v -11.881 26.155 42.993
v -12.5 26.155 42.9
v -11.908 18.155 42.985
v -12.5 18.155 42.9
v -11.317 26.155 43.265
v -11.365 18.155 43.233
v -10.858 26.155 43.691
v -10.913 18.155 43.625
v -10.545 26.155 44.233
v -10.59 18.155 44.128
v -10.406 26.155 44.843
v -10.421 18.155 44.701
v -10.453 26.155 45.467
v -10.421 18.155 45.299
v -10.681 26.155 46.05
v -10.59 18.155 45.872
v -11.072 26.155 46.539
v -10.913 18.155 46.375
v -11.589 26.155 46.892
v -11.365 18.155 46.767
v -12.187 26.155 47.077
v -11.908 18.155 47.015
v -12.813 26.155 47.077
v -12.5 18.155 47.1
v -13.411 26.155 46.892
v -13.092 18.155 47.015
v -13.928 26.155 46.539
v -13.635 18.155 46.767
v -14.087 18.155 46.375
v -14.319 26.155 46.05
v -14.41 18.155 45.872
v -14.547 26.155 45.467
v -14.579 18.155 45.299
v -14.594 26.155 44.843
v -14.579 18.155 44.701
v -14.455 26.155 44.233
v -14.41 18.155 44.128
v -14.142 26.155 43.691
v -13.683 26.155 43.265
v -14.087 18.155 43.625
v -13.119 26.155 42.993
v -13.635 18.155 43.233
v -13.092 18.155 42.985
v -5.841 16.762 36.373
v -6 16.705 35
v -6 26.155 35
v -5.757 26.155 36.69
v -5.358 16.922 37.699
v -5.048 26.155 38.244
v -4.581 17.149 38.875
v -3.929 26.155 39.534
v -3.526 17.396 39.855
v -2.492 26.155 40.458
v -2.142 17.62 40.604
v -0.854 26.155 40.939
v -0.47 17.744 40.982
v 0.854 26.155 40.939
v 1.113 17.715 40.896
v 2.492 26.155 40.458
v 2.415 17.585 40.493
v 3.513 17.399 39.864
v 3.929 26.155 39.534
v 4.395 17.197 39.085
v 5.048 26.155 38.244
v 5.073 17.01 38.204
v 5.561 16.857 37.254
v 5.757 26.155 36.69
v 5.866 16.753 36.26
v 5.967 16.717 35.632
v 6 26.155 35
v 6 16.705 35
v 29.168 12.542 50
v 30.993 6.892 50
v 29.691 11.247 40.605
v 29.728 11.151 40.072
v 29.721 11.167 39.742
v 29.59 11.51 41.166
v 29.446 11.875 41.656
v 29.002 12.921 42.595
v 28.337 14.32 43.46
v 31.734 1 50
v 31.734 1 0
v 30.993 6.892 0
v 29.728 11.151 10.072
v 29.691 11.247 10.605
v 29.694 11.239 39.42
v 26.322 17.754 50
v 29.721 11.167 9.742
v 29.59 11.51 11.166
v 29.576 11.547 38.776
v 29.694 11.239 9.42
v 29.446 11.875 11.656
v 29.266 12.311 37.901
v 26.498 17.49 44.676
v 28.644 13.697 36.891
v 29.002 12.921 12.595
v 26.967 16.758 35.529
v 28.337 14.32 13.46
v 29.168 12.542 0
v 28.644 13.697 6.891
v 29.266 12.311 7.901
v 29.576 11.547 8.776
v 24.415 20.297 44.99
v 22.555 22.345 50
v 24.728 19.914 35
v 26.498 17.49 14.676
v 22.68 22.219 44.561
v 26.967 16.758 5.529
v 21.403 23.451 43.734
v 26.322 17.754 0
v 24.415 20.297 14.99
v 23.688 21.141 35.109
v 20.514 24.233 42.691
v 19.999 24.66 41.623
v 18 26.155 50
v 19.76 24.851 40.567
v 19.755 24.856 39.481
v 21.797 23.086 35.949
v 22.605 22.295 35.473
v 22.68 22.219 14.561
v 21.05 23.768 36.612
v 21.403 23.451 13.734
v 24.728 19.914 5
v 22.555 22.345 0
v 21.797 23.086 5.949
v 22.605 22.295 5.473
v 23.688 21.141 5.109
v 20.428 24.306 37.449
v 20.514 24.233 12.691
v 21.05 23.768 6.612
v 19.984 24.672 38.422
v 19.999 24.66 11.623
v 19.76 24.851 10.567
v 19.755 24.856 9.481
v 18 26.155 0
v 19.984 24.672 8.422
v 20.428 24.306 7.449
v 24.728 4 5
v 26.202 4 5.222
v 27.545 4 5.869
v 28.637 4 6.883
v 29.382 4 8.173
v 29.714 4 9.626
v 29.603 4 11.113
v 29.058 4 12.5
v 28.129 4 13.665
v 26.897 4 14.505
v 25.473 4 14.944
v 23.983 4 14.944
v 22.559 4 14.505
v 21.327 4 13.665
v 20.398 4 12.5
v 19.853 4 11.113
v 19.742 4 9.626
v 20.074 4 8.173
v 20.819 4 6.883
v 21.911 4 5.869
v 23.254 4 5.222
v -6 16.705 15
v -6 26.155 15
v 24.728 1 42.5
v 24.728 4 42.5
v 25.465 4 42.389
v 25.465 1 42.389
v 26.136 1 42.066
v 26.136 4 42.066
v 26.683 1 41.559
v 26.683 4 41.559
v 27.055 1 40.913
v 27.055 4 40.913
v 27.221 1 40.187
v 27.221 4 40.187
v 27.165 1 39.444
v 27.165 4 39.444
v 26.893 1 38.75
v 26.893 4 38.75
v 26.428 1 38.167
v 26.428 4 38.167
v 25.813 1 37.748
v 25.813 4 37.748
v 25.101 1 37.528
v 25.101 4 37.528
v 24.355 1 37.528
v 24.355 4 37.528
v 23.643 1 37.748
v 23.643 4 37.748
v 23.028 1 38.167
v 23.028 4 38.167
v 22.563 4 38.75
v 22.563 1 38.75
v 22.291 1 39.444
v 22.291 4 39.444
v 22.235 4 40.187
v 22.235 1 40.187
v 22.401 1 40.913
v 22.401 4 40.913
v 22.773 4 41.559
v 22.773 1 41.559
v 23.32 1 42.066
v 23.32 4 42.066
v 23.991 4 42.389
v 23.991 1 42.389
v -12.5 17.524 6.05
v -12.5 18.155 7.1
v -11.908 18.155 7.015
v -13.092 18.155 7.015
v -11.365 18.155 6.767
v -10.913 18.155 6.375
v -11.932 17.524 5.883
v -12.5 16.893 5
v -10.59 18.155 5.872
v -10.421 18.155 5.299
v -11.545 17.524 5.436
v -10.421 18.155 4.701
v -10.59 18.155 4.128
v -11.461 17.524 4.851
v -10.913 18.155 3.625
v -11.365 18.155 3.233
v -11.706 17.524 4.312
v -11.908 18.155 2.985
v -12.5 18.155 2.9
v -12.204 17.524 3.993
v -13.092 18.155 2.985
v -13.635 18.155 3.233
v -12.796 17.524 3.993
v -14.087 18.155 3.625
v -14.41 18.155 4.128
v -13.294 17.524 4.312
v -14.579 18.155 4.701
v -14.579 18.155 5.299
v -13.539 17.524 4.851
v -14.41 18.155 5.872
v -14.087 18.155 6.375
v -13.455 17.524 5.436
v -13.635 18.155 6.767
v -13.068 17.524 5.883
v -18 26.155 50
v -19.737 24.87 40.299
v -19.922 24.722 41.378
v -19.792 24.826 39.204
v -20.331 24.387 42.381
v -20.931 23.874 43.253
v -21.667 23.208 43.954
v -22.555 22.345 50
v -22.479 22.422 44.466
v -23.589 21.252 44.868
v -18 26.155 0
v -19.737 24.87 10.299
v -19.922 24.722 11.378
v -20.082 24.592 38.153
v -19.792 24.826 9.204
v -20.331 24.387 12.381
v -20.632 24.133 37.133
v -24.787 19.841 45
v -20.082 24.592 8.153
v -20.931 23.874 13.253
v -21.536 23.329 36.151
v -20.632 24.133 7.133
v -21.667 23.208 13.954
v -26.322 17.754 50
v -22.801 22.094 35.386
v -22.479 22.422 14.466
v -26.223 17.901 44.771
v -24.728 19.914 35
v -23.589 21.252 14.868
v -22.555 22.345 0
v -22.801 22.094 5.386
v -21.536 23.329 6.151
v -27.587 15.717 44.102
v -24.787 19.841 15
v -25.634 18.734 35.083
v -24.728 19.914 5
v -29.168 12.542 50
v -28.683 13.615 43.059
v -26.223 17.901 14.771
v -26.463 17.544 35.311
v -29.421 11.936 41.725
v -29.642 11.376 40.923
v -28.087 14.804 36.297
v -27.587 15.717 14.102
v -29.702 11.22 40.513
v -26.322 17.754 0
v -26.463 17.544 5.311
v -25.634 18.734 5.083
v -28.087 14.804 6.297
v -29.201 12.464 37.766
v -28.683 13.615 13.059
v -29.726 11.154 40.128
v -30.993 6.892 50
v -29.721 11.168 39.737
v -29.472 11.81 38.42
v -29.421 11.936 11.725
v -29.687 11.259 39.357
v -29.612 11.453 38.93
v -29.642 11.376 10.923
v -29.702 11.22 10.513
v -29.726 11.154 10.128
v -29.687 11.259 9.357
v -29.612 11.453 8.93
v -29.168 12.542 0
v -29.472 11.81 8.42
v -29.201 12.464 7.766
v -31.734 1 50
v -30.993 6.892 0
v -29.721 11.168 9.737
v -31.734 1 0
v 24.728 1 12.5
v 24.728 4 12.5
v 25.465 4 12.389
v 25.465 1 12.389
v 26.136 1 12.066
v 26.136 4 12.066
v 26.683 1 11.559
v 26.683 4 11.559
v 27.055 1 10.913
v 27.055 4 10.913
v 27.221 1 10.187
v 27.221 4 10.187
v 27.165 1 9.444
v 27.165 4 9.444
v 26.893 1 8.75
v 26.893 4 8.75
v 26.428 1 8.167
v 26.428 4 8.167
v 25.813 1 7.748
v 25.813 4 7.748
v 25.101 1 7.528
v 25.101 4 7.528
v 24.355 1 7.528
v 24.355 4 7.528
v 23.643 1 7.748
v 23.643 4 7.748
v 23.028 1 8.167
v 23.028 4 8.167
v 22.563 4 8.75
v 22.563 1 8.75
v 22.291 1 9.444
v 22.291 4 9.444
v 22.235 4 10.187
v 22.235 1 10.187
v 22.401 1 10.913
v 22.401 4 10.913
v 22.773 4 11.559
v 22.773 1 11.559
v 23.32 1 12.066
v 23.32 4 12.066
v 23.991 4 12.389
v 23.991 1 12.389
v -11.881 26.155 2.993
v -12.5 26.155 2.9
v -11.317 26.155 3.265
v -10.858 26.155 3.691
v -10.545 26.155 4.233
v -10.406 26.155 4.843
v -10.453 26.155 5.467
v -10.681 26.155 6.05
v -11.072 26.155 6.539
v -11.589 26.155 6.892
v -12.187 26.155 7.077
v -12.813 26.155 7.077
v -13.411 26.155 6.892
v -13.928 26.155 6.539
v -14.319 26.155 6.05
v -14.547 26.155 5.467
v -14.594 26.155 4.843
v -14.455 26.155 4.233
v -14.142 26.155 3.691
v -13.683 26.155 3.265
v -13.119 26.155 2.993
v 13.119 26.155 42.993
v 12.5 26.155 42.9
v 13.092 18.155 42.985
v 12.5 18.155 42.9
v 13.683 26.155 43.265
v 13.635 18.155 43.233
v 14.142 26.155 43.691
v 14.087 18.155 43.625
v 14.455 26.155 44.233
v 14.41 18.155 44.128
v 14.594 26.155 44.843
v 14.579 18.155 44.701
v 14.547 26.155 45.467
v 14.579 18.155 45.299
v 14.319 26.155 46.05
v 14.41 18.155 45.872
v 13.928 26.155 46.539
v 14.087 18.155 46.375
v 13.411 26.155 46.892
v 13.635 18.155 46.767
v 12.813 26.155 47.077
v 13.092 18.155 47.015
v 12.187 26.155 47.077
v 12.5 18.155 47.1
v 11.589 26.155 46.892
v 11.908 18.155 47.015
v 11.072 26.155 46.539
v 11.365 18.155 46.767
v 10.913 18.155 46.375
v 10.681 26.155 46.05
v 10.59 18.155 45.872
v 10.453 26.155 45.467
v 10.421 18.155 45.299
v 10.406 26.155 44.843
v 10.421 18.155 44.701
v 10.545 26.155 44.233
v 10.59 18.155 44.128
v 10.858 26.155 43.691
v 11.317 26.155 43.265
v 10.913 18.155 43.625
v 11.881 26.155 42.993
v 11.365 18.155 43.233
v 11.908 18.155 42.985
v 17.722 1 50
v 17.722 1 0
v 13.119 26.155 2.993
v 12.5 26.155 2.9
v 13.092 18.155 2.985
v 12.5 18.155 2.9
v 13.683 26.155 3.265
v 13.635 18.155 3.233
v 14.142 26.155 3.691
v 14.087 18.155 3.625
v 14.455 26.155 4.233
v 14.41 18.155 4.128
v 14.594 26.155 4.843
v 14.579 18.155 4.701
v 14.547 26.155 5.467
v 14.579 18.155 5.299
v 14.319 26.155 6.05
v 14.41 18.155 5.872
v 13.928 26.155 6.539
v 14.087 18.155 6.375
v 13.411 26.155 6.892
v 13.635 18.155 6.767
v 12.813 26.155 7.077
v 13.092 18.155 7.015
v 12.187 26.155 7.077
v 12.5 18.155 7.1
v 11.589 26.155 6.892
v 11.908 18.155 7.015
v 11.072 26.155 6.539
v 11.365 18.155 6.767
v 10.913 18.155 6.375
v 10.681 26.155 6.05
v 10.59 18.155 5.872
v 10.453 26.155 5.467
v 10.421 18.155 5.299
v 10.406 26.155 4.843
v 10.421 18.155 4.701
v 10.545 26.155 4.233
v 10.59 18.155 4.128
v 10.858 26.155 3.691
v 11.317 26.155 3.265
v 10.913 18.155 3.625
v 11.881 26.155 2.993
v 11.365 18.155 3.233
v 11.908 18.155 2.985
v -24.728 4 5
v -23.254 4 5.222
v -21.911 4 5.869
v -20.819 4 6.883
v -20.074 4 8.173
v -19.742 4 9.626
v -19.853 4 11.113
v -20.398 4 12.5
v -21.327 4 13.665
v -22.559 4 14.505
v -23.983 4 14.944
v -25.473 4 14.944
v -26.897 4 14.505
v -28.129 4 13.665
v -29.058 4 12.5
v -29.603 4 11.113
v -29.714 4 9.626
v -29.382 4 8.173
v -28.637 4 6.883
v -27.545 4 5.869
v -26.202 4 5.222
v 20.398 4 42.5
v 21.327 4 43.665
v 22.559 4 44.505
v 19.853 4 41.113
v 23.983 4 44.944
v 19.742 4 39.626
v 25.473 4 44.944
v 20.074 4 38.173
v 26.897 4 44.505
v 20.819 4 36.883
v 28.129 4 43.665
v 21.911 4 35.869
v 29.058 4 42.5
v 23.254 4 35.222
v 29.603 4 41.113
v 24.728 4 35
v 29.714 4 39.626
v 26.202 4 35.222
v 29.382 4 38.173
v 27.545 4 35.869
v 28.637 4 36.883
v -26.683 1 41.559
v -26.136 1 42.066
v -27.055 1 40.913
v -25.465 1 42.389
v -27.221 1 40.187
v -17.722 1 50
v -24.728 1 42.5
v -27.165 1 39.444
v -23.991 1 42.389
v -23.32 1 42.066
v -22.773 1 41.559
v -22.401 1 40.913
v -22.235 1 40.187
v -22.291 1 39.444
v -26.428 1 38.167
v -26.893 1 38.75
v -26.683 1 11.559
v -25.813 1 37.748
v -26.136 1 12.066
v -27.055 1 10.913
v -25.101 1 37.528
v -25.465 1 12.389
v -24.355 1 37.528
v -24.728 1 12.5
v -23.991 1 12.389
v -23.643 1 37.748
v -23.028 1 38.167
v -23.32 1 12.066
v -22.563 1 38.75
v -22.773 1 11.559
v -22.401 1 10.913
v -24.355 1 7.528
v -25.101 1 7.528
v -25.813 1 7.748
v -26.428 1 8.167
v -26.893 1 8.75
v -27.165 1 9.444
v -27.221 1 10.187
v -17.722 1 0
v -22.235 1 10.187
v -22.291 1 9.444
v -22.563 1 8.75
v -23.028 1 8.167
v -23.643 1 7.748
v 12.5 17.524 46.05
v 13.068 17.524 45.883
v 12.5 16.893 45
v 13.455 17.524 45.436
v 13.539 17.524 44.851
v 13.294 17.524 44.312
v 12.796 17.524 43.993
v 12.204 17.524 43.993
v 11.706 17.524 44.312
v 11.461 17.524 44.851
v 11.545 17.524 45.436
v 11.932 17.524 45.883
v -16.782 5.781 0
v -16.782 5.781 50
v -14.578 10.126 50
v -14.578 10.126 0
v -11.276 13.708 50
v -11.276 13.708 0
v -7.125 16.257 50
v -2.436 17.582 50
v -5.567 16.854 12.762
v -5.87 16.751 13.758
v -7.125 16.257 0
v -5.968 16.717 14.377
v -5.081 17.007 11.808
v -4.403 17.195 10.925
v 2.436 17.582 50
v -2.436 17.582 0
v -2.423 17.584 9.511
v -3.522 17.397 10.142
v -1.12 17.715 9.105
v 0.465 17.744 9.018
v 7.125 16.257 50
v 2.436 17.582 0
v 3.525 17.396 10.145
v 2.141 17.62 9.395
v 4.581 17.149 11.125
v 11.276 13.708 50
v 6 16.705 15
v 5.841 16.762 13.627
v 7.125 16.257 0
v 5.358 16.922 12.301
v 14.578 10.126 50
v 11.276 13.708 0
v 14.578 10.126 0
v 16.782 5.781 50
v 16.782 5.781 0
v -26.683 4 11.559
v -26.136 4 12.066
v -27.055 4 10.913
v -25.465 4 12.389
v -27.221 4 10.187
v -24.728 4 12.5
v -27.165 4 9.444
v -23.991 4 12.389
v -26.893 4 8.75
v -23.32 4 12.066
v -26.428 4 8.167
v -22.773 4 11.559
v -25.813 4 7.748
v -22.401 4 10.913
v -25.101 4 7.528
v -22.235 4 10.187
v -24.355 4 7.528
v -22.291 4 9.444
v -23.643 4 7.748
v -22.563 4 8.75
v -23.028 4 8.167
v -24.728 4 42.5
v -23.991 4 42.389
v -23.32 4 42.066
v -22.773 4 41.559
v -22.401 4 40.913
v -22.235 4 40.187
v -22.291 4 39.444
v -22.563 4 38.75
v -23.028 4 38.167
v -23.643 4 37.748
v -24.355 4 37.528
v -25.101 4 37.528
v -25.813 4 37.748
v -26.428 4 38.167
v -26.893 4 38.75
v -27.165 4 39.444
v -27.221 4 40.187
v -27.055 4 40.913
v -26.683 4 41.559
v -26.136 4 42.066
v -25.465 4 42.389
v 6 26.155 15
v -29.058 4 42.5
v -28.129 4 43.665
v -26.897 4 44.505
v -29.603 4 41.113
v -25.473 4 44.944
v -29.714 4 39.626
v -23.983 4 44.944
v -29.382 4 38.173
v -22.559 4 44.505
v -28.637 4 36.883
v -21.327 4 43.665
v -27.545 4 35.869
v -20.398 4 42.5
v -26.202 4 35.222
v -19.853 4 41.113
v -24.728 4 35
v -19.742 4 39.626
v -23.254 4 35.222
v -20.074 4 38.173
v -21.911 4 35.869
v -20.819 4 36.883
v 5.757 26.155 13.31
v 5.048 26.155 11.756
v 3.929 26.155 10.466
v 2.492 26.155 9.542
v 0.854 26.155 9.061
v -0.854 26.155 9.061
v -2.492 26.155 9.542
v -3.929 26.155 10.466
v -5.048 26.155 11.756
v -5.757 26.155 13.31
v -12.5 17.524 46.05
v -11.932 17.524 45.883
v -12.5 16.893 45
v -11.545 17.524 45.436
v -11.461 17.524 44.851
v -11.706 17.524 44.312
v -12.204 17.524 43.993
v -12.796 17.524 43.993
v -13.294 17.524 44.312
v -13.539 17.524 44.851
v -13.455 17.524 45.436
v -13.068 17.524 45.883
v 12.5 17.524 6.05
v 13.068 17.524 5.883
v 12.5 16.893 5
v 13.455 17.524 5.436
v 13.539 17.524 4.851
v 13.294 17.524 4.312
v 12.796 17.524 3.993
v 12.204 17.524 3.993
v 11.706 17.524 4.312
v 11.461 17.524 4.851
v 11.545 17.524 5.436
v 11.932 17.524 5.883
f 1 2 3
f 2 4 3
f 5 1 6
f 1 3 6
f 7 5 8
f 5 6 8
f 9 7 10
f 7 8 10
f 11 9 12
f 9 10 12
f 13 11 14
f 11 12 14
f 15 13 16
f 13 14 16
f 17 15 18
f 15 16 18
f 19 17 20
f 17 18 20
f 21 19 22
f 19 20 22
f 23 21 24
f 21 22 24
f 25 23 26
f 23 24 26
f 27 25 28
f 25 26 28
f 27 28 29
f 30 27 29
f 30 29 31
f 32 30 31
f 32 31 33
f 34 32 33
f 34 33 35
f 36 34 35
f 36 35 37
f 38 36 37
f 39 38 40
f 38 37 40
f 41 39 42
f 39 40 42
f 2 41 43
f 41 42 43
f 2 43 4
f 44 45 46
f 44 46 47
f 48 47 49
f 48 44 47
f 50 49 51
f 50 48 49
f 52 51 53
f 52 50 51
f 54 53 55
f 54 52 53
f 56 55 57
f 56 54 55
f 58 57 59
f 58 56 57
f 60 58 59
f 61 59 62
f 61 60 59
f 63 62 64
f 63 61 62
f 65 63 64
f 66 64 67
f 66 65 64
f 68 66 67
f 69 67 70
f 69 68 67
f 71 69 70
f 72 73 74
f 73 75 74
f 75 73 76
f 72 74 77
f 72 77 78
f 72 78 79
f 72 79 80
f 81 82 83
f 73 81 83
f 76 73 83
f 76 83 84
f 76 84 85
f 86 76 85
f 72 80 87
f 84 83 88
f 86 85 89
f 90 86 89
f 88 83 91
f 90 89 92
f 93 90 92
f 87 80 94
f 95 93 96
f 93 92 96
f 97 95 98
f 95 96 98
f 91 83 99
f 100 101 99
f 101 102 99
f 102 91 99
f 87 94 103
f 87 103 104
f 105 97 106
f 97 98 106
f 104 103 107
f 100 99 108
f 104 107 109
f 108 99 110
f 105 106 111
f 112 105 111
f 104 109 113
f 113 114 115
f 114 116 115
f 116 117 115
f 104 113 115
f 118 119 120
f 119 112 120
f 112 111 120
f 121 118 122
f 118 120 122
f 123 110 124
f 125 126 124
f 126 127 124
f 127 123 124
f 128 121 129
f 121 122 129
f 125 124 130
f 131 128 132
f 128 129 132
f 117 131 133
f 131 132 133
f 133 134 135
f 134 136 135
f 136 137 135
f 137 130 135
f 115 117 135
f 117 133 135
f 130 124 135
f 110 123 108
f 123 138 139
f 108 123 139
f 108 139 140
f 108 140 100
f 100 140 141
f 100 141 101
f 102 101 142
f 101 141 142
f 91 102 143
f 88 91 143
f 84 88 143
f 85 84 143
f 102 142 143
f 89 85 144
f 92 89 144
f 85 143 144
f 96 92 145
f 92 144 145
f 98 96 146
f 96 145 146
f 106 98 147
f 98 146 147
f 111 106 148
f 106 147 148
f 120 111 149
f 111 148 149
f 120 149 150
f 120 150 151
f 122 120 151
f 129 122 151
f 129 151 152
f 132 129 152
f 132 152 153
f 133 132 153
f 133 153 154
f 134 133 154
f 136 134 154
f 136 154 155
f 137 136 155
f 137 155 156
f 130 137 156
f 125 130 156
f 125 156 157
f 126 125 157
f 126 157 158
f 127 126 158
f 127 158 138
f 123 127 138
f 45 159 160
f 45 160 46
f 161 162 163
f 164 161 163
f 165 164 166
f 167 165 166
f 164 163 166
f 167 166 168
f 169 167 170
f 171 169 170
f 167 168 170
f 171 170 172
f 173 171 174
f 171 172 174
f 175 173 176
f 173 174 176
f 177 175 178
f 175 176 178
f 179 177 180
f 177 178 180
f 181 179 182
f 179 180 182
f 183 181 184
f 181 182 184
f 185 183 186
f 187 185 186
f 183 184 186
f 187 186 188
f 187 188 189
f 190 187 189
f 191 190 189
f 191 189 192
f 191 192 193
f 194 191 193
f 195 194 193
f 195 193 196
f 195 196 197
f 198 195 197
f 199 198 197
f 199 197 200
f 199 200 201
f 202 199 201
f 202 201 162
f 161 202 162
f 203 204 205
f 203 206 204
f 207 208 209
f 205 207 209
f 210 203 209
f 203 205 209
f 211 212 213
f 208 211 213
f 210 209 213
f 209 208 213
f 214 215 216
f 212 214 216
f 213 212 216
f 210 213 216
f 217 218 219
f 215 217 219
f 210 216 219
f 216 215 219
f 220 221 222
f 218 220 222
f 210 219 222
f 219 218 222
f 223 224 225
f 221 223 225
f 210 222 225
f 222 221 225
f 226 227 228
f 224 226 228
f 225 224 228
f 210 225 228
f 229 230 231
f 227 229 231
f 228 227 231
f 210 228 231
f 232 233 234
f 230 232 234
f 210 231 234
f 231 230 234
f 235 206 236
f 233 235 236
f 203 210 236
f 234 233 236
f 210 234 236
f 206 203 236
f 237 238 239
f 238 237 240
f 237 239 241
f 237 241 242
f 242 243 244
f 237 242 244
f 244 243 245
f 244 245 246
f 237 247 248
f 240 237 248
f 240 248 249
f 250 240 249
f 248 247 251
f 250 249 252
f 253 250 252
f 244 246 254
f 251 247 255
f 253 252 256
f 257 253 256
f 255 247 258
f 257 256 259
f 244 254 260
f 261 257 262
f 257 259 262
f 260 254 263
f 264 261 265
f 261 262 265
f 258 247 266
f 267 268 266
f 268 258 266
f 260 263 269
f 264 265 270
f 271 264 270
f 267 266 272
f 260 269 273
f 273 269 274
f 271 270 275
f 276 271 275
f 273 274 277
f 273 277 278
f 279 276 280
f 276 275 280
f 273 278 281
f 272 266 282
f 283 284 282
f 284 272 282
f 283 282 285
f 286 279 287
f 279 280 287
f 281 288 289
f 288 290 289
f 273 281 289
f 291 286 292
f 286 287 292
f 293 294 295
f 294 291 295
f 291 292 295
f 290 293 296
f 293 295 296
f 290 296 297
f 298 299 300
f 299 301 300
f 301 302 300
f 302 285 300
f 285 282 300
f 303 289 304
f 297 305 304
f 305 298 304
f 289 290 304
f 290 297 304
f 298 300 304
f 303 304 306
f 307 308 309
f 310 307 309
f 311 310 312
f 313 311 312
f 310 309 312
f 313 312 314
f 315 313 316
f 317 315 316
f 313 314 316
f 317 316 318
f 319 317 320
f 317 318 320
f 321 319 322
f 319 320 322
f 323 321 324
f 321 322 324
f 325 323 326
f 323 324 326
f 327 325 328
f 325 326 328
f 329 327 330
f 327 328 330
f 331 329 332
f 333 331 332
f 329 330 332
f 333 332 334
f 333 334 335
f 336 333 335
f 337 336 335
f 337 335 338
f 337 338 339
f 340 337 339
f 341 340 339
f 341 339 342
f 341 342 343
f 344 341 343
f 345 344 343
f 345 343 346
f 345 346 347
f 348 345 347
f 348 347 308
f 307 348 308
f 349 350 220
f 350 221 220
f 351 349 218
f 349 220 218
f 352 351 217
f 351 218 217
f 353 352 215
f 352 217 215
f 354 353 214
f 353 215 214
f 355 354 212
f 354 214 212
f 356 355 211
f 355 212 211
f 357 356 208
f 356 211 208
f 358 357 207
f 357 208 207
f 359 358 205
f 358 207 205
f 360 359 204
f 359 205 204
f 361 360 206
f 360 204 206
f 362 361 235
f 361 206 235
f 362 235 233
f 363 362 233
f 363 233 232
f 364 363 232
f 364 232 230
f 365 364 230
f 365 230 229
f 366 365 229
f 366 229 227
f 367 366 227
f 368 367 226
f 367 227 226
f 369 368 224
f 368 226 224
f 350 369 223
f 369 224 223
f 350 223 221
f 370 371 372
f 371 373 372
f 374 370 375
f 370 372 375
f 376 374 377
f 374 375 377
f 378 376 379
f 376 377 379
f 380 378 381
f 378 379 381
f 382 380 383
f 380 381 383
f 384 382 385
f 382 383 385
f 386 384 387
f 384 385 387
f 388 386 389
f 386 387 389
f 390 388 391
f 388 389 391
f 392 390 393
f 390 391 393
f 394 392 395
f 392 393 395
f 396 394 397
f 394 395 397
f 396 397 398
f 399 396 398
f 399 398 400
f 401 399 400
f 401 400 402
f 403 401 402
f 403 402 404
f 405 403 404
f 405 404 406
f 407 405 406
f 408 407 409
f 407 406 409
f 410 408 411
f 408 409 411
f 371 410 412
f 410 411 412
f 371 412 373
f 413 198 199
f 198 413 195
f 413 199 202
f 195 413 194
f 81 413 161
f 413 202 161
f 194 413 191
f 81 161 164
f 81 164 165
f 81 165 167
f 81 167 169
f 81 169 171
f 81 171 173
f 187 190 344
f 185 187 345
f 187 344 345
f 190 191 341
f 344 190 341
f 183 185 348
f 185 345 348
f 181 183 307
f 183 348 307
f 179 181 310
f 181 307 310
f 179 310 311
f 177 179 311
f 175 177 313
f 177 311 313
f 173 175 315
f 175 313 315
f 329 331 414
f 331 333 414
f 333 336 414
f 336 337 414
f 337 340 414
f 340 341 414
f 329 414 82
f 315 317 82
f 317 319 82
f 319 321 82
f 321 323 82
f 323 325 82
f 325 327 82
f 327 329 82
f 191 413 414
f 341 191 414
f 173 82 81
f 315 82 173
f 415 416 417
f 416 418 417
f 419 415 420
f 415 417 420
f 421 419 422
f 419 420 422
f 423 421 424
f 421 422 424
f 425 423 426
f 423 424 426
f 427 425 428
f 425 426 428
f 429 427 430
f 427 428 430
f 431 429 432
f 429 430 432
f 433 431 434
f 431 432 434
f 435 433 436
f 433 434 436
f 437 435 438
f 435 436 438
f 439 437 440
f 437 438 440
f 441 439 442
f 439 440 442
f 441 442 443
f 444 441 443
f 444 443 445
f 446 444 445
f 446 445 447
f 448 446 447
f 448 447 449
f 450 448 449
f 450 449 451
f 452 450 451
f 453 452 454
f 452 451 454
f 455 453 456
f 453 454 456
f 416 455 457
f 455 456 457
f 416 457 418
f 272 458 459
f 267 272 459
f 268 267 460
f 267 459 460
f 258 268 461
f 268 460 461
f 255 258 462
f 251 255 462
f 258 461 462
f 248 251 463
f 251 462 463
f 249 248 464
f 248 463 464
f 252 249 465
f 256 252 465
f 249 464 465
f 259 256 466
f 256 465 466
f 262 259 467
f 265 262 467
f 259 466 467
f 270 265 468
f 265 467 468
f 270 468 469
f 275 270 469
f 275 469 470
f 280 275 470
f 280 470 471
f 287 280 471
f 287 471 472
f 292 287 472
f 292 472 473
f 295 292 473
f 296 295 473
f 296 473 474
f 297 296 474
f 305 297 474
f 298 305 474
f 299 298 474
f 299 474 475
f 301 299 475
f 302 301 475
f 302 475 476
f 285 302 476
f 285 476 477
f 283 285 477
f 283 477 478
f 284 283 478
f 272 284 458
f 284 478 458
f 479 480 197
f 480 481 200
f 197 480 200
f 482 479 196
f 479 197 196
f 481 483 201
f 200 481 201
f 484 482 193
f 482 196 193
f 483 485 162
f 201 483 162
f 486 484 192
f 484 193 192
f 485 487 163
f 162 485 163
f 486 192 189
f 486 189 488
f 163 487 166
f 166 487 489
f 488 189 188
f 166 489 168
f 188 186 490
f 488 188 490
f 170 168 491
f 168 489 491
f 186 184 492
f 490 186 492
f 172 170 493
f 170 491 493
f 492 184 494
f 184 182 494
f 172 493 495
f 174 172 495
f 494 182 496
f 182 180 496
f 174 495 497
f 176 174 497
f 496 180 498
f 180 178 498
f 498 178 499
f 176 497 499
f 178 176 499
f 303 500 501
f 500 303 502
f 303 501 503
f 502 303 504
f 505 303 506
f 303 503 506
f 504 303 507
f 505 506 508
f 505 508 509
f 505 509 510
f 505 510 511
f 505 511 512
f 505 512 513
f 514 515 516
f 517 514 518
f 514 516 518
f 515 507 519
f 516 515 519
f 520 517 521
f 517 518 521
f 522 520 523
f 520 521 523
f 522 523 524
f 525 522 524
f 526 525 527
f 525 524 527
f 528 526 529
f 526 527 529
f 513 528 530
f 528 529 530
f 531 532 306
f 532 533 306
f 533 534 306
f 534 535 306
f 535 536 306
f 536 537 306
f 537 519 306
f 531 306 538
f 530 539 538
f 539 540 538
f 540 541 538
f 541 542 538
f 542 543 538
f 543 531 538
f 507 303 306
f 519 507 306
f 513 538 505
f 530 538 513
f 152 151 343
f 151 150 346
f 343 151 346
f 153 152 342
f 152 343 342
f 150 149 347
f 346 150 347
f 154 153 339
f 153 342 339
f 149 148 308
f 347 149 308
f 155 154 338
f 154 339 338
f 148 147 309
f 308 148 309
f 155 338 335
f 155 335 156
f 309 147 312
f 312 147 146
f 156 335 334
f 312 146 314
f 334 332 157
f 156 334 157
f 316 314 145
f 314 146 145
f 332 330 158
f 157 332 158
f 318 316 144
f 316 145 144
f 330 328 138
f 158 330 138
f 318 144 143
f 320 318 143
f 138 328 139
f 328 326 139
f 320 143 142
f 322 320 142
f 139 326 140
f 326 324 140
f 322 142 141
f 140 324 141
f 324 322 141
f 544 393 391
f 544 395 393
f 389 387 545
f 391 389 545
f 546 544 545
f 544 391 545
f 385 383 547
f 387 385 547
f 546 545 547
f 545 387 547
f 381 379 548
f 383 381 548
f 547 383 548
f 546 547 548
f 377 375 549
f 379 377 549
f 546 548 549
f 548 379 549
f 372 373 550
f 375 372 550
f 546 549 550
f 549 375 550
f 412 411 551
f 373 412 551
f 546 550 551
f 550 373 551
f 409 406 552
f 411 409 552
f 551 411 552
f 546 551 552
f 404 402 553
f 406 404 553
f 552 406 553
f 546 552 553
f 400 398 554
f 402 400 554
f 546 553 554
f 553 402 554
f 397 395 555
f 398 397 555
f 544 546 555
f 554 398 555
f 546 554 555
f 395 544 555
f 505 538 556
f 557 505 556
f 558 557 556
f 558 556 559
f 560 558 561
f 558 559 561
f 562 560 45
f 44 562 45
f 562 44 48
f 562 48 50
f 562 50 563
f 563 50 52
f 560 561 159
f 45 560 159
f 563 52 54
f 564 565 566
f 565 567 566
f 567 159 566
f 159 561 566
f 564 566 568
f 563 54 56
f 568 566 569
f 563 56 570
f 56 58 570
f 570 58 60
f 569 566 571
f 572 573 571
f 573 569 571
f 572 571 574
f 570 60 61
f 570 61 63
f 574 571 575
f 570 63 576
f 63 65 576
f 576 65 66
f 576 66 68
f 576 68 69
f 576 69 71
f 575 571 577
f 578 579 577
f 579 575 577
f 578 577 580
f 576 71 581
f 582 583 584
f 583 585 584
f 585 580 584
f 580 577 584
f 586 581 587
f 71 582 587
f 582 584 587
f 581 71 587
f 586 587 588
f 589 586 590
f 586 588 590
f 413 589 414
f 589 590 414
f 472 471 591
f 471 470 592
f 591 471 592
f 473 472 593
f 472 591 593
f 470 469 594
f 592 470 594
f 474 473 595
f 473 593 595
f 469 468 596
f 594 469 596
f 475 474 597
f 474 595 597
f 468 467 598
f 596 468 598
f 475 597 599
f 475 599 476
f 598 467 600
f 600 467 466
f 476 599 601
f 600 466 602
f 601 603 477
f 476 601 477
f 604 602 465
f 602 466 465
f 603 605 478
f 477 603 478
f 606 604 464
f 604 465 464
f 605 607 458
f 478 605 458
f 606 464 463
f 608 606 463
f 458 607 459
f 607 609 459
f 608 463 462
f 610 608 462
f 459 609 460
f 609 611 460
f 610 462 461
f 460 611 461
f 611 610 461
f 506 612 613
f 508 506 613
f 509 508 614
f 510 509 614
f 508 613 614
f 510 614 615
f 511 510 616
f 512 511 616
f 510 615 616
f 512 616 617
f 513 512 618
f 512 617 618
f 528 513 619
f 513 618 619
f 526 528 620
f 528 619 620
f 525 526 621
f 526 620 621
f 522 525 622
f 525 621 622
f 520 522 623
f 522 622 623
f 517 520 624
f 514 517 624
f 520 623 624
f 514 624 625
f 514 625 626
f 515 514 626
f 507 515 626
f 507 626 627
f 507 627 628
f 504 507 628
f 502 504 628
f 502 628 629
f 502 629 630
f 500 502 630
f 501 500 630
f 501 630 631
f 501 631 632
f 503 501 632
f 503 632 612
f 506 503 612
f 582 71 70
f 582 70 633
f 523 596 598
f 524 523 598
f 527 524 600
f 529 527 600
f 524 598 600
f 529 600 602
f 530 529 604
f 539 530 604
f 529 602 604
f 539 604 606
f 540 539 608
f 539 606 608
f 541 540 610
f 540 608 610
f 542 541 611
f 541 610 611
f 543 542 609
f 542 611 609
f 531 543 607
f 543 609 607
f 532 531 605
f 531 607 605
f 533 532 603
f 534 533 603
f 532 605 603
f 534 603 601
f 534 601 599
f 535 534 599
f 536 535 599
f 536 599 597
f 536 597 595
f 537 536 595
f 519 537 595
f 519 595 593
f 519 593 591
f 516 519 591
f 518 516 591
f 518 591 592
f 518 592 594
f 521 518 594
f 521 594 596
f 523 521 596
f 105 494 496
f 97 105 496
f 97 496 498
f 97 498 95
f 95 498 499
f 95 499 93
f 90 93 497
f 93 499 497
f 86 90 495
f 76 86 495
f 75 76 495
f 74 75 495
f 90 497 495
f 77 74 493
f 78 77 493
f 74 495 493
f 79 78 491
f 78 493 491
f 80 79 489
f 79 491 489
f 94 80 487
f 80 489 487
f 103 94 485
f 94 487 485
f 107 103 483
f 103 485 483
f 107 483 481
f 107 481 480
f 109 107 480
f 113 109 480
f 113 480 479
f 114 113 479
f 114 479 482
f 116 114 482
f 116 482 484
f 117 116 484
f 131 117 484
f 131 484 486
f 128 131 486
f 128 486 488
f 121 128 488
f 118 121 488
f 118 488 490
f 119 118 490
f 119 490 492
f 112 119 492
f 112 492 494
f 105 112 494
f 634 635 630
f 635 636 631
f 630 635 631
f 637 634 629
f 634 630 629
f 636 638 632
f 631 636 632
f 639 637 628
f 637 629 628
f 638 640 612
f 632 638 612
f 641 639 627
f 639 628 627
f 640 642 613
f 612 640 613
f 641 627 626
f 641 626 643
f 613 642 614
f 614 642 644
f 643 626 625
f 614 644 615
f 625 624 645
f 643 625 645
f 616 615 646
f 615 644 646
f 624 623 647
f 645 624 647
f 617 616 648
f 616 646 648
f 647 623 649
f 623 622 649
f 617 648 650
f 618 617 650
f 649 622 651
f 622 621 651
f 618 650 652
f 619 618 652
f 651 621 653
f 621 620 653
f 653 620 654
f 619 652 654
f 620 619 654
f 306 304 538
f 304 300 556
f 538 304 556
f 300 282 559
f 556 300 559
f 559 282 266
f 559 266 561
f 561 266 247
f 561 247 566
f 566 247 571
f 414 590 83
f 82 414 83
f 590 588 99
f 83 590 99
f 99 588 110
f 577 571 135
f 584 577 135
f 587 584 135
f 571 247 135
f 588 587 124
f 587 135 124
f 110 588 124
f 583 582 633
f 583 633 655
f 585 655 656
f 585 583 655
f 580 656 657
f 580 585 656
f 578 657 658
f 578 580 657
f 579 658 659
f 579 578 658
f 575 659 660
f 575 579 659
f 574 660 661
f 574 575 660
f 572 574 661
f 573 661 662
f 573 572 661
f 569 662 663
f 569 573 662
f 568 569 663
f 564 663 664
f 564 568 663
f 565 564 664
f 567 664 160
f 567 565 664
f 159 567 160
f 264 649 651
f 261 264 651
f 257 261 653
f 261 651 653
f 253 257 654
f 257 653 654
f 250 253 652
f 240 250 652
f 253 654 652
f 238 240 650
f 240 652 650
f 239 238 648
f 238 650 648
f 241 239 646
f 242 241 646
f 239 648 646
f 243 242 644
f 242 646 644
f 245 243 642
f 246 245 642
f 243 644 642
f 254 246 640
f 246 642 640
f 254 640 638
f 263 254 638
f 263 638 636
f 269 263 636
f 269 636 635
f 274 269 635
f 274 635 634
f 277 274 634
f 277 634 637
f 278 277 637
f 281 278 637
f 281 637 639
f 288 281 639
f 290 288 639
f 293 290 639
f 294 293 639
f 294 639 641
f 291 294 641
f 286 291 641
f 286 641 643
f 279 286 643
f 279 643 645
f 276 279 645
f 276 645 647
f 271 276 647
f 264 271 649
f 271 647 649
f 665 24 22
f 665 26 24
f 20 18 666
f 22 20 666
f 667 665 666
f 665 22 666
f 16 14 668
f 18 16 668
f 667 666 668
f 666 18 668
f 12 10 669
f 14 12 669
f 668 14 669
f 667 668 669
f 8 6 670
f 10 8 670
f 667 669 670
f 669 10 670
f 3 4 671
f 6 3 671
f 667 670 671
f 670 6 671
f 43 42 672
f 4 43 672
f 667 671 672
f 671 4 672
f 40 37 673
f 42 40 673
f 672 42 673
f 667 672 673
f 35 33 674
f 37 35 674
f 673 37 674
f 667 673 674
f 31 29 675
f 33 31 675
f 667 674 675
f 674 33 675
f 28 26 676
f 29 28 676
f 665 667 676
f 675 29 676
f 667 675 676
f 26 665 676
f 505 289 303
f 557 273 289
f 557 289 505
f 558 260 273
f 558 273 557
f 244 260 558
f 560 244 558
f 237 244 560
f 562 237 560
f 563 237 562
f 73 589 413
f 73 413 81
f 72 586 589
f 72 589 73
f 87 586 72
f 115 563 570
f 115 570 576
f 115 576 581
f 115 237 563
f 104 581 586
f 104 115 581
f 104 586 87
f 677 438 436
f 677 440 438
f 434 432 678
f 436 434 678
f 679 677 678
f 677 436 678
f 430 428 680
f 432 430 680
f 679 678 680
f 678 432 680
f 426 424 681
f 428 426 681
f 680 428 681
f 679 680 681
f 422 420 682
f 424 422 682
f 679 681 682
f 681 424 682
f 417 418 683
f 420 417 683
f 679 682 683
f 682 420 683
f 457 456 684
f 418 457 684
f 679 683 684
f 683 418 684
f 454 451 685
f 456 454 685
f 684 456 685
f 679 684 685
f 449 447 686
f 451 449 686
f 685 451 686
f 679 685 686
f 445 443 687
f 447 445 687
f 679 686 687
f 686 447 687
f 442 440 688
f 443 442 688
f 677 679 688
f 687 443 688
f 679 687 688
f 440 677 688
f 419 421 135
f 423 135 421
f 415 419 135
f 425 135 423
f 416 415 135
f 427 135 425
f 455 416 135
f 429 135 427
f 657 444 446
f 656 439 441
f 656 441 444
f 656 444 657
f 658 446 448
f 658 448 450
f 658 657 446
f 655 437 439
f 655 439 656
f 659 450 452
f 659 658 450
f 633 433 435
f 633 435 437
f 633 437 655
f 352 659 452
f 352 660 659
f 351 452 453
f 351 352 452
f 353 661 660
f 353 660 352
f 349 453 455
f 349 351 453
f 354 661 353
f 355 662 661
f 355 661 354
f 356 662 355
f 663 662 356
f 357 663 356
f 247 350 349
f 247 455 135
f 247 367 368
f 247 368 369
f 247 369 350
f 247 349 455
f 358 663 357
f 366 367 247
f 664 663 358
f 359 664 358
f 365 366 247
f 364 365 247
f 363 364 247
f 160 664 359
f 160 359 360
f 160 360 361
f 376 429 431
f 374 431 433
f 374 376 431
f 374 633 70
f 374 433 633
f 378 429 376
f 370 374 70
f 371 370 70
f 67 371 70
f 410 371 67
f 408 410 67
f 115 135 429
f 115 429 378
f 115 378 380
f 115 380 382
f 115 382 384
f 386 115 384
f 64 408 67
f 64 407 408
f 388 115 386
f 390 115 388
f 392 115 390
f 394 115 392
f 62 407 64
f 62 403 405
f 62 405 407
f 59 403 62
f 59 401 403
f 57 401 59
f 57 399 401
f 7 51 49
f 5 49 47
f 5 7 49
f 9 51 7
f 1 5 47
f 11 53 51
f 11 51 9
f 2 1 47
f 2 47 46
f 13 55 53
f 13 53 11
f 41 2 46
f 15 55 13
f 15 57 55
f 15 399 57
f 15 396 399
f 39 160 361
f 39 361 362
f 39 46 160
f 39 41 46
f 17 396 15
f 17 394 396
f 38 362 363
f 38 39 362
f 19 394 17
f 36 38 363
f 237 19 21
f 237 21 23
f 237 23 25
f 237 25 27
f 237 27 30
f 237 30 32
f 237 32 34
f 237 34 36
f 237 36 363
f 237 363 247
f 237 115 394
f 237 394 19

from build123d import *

# Parameters (mm, degrees)
BOSS_EXTRUDE1_DEPTH             = 50
F_5_0MM_CLEARANCE_DOWEL_HOLE1_D = 5
CUT_EXTRUDE1_REACH              = 67.4
CUT_EXTRUDE1_END_RADIUS         = 31.75
SKETCH4_R                       = 5
CUT_EXTRUDE2_REACH              = 68.728
CUT_EXTRUDE2_END_RADIUS         = 31.75
CUT_EXTRUDE3_DEPTH              = 68.19468002
TAP_DRILL_FOR_M5X0_8_TAP1_D     = 4.2
TAP_DRILL_FOR_M5X0_8_TAP1_DEPTH = 8
TAP_DRILL_FOR_M5X0_8_TAP1_TIP   = 1.2618073


with BuildPart() as part:
    # Sketch1 → Boss-Extrude1 (new body)
    with BuildSketch(Plane.XY):
        with BuildLine():
            Line((-31.734248061, 1), (-17.721808598, 1))
            ThreePointArc((-17.721808598, 1), (0, 17.75), (17.721808598, 1))
            Line((17.721808598, 1), (31.734248061, 1))
            ThreePointArc((31.734248061, 1), (0, 31.75), (-31.734248061, 1))
        make_face()
    extrude(amount=BOSS_EXTRUDE1_DEPTH)

    # Ø5.0mm Clearance Dowel Hole1 (through all)
    with Locations(Plane(origin=(-24.72802833, 1, 40), x_dir=(0, 0, -1), z_dir=(0, -1, 0))):
        with Locations((0, 0), (30, 0), (0, 49.45605666), (30, 49.45605666)):
            Hole(F_5_0MM_CLEARANCE_DOWEL_HOLE1_D / 2)

    # Cut-Extrude1: up to this cylinder (the profile starts inside it)
    cut_extrude1_end = Plane(origin=(0, 0, 25), z_dir=(0, 0, -1)) * Cylinder(CUT_EXTRUDE1_END_RADIUS, 229.3, mode=Mode.PRIVATE)
    # Sketch4 → Cut-Extrude1 (cut, up to the surface)
    with BuildSketch(Plane(origin=(0, 4, 0), x_dir=(-1, 0, 0), z_dir=(0, -1, 0)), mode=Mode.PRIVATE) as cut_extrude1_sk1:
        with Locations(Location((24.72802833, -40, 0), (0, 0, 90))):
            Circle(SKETCH4_R)
    cut_extrude1_tool1 = extrude(cut_extrude1_sk1.sketch, amount=-CUT_EXTRUDE1_REACH, mode=Mode.PRIVATE) & cut_extrude1_end
    add(cut_extrude1_tool1.solids().sort_by_distance((-24.728028, 4, 40))[0], mode=Mode.SUBTRACT)
    # Sketch4 → Cut-Extrude1 (cut, up to the surface)
    with BuildSketch(Plane(origin=(0, 4, 0), x_dir=(-1, 0, 0), z_dir=(0, -1, 0)), mode=Mode.PRIVATE) as cut_extrude1_sk2:
        with Locations(Location((24.72802833, -10, 0), (0, 0, 90))):
            Circle(SKETCH4_R)
    cut_extrude1_tool2 = extrude(cut_extrude1_sk2.sketch, amount=-CUT_EXTRUDE1_REACH, mode=Mode.PRIVATE) & cut_extrude1_end
    add(cut_extrude1_tool2.solids().sort_by_distance((-24.728028, 4, 10))[0], mode=Mode.SUBTRACT)
    # Sketch4 → Cut-Extrude1 (cut, up to the surface)
    with BuildSketch(Plane(origin=(0, 4, 0), x_dir=(-1, 0, 0), z_dir=(0, -1, 0)), mode=Mode.PRIVATE) as cut_extrude1_sk3:
        with Locations(Location((-24.72802833, -10, 0), (0, 0, 90))):
            Circle(SKETCH4_R)
    cut_extrude1_tool3 = extrude(cut_extrude1_sk3.sketch, amount=-CUT_EXTRUDE1_REACH, mode=Mode.PRIVATE) & cut_extrude1_end
    add(cut_extrude1_tool3.solids().sort_by_distance((24.728028, 4, 10))[0], mode=Mode.SUBTRACT)
    # Sketch4 → Cut-Extrude1 (cut, up to the surface)
    with BuildSketch(Plane(origin=(0, 4, 0), x_dir=(-1, 0, 0), z_dir=(0, -1, 0)), mode=Mode.PRIVATE) as cut_extrude1_sk4:
        with Locations(Location((-24.72802833, -40, 0), (0, 0, 90))):
            Circle(SKETCH4_R)
    cut_extrude1_tool4 = extrude(cut_extrude1_sk4.sketch, amount=-CUT_EXTRUDE1_REACH, mode=Mode.PRIVATE) & cut_extrude1_end
    add(cut_extrude1_tool4.solids().sort_by_distance((24.728028, 4, 40))[0], mode=Mode.SUBTRACT)

    # Cut-Extrude2: up to this cylinder (the profile starts inside it)
    cut_extrude2_end = Plane(origin=(0, 0, 25), z_dir=(0, 0, -1)) * Cylinder(CUT_EXTRUDE2_END_RADIUS, 201.956, mode=Mode.PRIVATE)
    # Sketch5 → Cut-Extrude2 (cut, up to the surface)
    with BuildSketch(Plane(origin=(0, 1, 0), x_dir=(-1, 0, 0), z_dir=(0, -1, 0)), mode=Mode.PRIVATE) as cut_extrude2_sk1:
        with BuildLine():
            Line((-6, -35), (-6, -15))
            ThreePointArc((-6, -15), (0, -9), (6, -15))
            Line((6, -15), (6, -35))
            ThreePointArc((6, -35), (0, -41), (-6, -35))
        make_face()
    cut_extrude2_tool1 = extrude(cut_extrude2_sk1.sketch, amount=-CUT_EXTRUDE2_REACH, mode=Mode.PRIVATE) & cut_extrude2_end
    add(cut_extrude2_tool1.solids().sort_by_distance((0, 1, 25))[0], mode=Mode.SUBTRACT)

    # Sketch6 → Cut-Extrude3 (cut, through all)
    with BuildSketch(Plane.XY.offset(50)):
        with BuildLine():
            Line((18, 26.154588508), (-18, 26.154588508))
            ThreePointArc((-18, 26.154588508), (0, 31.75), (18, 26.154588508))
        make_face()
    extrude(amount=-CUT_EXTRUDE3_DEPTH, mode=Mode.SUBTRACT)

    # Tap Drill for M5x0.8 Tap1
    with Locations(Plane(origin=(-12.5, 26.154588508, 5), x_dir=(0, 0, 1), z_dir=(0, 1, 0))):
        with Locations((0, 0), (40, 0), (40, 25), (0, 25)):
            Hole(TAP_DRILL_FOR_M5X0_8_TAP1_D / 2, depth=TAP_DRILL_FOR_M5X0_8_TAP1_DEPTH)
            with Locations((0, 0, -(TAP_DRILL_FOR_M5X0_8_TAP1_DEPTH + TAP_DRILL_FOR_M5X0_8_TAP1_TIP / 2))):  # 118° drill point
                Cone(0, TAP_DRILL_FOR_M5X0_8_TAP1_D / 2, TAP_DRILL_FOR_M5X0_8_TAP1_TIP, mode=Mode.SUBTRACT)


solid = part.part
